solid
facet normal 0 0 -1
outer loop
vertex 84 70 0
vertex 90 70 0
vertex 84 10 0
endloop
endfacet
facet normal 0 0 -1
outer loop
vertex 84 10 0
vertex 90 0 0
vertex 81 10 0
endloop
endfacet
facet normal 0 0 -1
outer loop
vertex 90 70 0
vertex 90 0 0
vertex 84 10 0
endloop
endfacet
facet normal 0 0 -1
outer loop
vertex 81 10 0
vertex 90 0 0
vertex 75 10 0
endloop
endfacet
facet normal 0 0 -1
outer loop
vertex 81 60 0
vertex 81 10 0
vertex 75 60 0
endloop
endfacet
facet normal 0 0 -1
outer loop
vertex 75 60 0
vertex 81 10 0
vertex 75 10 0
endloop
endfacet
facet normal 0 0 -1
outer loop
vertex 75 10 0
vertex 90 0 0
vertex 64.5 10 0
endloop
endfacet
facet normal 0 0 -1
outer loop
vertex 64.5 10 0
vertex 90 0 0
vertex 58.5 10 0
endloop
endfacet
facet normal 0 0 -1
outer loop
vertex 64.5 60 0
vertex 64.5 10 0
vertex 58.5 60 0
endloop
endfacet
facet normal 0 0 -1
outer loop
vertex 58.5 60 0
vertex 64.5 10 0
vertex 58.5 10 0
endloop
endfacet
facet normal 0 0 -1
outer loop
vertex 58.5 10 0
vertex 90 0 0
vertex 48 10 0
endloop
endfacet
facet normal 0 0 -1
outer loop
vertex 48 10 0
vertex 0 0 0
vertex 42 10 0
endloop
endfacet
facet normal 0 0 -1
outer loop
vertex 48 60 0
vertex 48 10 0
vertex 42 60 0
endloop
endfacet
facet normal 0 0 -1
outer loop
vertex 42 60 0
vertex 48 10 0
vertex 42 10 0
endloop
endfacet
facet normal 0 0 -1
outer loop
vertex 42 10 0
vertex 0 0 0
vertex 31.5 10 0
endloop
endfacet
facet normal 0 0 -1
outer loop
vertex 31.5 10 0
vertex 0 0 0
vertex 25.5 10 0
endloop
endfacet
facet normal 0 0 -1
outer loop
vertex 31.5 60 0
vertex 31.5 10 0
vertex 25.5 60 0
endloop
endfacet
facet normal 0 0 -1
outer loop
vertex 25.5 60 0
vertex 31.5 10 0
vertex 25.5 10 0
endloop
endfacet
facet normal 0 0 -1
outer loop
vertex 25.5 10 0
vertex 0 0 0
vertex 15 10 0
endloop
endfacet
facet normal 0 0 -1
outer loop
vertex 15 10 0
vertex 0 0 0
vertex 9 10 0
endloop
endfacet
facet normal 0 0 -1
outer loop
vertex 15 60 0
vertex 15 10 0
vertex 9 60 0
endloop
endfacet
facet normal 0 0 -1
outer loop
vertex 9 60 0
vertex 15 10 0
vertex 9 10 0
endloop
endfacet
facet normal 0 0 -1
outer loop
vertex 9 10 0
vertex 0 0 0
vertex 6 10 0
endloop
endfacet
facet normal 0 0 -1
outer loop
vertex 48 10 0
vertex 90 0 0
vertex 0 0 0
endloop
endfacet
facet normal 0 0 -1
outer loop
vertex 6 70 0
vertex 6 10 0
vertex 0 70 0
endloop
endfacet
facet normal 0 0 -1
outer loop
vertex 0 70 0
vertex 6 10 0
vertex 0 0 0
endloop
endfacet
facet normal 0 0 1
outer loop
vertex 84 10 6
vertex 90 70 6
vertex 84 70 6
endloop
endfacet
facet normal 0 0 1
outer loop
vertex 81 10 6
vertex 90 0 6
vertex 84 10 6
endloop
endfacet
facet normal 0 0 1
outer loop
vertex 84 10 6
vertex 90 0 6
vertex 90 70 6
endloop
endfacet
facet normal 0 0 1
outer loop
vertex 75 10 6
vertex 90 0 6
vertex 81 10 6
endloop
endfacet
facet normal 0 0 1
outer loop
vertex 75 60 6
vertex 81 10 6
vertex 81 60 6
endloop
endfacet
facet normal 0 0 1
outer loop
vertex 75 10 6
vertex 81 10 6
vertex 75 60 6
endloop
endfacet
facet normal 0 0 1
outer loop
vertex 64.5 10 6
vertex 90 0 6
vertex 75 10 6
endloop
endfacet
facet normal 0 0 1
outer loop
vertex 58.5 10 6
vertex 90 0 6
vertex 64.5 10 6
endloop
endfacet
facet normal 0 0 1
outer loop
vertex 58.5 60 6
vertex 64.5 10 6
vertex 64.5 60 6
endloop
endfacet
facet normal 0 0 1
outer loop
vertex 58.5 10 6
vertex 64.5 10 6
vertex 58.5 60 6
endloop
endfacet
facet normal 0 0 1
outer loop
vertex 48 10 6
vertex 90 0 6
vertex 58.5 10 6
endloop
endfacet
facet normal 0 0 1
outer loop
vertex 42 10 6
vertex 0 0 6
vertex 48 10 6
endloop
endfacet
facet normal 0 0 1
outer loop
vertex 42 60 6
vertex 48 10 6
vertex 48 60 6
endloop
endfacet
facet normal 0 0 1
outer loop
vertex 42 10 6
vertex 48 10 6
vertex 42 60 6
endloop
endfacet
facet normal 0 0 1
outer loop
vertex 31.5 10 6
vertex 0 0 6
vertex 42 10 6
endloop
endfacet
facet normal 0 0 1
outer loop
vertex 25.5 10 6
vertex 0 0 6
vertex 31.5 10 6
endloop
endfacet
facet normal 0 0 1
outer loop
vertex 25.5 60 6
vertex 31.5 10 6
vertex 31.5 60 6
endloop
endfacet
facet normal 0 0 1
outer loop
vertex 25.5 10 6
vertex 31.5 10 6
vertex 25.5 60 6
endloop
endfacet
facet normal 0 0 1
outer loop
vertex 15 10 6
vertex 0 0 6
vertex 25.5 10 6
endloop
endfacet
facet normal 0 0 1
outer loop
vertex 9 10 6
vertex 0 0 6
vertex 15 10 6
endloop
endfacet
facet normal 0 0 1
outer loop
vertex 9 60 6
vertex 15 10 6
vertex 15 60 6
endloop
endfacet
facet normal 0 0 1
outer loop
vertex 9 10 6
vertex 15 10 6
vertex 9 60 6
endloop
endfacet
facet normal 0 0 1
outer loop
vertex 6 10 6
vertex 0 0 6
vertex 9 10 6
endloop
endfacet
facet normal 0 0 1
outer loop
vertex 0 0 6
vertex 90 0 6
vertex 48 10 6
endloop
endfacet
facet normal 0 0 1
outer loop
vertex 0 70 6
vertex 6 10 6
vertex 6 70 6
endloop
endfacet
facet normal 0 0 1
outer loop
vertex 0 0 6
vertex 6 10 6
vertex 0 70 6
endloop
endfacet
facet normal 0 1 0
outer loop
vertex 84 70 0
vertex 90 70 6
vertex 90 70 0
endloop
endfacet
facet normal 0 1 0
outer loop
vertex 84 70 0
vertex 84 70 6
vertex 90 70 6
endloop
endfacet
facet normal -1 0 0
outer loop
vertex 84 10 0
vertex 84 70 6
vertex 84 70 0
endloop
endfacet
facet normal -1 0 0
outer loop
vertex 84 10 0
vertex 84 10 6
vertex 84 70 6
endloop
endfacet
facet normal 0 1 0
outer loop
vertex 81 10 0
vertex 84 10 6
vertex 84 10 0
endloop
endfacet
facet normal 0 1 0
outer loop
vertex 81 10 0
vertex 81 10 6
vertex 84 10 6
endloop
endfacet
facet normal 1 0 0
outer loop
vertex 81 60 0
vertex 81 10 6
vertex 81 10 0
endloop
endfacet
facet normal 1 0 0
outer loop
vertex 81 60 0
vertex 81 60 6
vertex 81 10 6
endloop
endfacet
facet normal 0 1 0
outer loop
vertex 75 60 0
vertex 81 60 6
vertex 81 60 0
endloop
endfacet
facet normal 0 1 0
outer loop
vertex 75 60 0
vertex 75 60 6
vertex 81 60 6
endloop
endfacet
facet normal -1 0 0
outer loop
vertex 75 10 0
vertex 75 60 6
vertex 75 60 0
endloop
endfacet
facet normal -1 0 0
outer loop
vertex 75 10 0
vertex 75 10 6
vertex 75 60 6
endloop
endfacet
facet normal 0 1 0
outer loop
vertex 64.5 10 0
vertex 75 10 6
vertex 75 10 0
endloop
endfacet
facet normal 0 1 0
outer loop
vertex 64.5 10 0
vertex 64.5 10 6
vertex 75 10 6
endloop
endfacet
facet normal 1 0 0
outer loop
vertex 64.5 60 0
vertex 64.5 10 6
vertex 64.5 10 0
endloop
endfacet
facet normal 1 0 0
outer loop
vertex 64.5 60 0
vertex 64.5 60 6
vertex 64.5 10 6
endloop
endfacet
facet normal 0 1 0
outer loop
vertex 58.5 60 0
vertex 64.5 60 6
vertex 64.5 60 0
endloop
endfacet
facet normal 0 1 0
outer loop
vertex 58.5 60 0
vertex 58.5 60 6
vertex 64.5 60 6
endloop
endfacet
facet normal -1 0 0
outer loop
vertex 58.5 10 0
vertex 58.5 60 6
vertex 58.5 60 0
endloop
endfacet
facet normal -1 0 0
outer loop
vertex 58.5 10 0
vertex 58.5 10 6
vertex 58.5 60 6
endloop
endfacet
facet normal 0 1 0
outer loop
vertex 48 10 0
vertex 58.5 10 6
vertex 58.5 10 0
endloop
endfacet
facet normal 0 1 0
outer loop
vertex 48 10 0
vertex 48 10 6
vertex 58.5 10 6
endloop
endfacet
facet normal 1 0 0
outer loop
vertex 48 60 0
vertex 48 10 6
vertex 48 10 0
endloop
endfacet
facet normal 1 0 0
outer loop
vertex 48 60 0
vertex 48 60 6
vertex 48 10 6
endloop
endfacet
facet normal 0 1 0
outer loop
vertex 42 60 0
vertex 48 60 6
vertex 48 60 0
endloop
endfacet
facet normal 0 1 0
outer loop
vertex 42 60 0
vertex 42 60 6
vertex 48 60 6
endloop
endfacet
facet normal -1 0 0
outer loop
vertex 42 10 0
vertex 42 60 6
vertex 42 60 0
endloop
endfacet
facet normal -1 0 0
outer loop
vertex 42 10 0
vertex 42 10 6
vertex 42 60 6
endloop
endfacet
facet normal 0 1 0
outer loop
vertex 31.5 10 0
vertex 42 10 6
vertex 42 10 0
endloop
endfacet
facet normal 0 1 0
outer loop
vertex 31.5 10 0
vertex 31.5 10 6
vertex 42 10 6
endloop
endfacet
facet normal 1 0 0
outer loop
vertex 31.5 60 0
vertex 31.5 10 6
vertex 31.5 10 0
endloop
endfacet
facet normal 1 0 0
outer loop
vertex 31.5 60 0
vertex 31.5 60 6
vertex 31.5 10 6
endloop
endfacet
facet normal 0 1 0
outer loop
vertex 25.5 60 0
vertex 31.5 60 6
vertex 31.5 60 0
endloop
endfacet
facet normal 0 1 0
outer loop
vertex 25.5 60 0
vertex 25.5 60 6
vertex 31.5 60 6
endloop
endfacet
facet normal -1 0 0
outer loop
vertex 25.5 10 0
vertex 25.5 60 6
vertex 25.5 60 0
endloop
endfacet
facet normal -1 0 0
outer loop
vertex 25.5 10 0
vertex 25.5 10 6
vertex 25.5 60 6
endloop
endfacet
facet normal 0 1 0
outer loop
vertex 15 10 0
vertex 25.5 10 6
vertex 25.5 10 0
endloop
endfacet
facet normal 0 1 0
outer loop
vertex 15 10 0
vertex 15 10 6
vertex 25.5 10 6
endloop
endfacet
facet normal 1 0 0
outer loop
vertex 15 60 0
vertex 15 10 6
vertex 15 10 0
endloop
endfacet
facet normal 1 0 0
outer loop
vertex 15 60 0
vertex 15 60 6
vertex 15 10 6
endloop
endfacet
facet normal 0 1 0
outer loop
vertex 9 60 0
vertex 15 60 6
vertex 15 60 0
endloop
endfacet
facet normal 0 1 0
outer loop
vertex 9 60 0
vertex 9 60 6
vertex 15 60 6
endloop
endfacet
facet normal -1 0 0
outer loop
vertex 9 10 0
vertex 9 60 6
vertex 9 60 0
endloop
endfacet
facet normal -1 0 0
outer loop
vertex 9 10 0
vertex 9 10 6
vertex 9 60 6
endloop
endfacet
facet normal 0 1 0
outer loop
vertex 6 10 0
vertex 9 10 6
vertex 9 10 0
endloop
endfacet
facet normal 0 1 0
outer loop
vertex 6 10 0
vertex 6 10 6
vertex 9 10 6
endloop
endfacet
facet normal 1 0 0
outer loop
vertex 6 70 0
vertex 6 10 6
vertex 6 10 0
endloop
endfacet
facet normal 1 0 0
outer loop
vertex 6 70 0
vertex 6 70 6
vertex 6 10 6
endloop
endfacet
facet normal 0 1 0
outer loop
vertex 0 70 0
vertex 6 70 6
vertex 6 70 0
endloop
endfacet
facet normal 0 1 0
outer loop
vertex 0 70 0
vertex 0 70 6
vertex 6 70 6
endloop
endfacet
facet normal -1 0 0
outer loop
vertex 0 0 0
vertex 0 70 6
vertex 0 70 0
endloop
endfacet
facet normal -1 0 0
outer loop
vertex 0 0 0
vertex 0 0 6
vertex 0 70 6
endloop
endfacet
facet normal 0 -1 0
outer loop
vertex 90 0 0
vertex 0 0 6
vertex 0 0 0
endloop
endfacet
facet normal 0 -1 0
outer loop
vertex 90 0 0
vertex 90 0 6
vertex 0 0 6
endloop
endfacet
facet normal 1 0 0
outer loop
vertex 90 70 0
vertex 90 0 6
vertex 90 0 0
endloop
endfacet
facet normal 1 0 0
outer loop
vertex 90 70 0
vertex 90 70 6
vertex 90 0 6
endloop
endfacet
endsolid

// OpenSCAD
$fn = 32;

// ----------------------------------------------------------------------
// Guard grille: 5 slats over a 90 x 70 mm plate
// ----------------------------------------------------------------------

// --- parameters (mm) ---
profile_height = 6;       // extrusion height
profile_points = 28;      // points of the closed outline

profile = [[0, 0], [90, 0], [90, 70], [84, 70], [84, 10], [81, 10], [81, 60], [75, 60], [75, 10], [64.5, 10], [64.5, 60], [58.5, 60], [58.5, 10], [48, 10], [48, 60], [42, 60], [42, 10], [31.5, 10], [31.5, 60], [25.5, 60], [25.5, 10], [15, 10], [15, 60], [9, 60], [9, 10], [6, 10], [6, 70], [0, 70]];  // single closed polygon, 28 points, counter clockwise

// --- the one profile operation ---
linear_extrude(height = profile_height) polygon(points = profile);
